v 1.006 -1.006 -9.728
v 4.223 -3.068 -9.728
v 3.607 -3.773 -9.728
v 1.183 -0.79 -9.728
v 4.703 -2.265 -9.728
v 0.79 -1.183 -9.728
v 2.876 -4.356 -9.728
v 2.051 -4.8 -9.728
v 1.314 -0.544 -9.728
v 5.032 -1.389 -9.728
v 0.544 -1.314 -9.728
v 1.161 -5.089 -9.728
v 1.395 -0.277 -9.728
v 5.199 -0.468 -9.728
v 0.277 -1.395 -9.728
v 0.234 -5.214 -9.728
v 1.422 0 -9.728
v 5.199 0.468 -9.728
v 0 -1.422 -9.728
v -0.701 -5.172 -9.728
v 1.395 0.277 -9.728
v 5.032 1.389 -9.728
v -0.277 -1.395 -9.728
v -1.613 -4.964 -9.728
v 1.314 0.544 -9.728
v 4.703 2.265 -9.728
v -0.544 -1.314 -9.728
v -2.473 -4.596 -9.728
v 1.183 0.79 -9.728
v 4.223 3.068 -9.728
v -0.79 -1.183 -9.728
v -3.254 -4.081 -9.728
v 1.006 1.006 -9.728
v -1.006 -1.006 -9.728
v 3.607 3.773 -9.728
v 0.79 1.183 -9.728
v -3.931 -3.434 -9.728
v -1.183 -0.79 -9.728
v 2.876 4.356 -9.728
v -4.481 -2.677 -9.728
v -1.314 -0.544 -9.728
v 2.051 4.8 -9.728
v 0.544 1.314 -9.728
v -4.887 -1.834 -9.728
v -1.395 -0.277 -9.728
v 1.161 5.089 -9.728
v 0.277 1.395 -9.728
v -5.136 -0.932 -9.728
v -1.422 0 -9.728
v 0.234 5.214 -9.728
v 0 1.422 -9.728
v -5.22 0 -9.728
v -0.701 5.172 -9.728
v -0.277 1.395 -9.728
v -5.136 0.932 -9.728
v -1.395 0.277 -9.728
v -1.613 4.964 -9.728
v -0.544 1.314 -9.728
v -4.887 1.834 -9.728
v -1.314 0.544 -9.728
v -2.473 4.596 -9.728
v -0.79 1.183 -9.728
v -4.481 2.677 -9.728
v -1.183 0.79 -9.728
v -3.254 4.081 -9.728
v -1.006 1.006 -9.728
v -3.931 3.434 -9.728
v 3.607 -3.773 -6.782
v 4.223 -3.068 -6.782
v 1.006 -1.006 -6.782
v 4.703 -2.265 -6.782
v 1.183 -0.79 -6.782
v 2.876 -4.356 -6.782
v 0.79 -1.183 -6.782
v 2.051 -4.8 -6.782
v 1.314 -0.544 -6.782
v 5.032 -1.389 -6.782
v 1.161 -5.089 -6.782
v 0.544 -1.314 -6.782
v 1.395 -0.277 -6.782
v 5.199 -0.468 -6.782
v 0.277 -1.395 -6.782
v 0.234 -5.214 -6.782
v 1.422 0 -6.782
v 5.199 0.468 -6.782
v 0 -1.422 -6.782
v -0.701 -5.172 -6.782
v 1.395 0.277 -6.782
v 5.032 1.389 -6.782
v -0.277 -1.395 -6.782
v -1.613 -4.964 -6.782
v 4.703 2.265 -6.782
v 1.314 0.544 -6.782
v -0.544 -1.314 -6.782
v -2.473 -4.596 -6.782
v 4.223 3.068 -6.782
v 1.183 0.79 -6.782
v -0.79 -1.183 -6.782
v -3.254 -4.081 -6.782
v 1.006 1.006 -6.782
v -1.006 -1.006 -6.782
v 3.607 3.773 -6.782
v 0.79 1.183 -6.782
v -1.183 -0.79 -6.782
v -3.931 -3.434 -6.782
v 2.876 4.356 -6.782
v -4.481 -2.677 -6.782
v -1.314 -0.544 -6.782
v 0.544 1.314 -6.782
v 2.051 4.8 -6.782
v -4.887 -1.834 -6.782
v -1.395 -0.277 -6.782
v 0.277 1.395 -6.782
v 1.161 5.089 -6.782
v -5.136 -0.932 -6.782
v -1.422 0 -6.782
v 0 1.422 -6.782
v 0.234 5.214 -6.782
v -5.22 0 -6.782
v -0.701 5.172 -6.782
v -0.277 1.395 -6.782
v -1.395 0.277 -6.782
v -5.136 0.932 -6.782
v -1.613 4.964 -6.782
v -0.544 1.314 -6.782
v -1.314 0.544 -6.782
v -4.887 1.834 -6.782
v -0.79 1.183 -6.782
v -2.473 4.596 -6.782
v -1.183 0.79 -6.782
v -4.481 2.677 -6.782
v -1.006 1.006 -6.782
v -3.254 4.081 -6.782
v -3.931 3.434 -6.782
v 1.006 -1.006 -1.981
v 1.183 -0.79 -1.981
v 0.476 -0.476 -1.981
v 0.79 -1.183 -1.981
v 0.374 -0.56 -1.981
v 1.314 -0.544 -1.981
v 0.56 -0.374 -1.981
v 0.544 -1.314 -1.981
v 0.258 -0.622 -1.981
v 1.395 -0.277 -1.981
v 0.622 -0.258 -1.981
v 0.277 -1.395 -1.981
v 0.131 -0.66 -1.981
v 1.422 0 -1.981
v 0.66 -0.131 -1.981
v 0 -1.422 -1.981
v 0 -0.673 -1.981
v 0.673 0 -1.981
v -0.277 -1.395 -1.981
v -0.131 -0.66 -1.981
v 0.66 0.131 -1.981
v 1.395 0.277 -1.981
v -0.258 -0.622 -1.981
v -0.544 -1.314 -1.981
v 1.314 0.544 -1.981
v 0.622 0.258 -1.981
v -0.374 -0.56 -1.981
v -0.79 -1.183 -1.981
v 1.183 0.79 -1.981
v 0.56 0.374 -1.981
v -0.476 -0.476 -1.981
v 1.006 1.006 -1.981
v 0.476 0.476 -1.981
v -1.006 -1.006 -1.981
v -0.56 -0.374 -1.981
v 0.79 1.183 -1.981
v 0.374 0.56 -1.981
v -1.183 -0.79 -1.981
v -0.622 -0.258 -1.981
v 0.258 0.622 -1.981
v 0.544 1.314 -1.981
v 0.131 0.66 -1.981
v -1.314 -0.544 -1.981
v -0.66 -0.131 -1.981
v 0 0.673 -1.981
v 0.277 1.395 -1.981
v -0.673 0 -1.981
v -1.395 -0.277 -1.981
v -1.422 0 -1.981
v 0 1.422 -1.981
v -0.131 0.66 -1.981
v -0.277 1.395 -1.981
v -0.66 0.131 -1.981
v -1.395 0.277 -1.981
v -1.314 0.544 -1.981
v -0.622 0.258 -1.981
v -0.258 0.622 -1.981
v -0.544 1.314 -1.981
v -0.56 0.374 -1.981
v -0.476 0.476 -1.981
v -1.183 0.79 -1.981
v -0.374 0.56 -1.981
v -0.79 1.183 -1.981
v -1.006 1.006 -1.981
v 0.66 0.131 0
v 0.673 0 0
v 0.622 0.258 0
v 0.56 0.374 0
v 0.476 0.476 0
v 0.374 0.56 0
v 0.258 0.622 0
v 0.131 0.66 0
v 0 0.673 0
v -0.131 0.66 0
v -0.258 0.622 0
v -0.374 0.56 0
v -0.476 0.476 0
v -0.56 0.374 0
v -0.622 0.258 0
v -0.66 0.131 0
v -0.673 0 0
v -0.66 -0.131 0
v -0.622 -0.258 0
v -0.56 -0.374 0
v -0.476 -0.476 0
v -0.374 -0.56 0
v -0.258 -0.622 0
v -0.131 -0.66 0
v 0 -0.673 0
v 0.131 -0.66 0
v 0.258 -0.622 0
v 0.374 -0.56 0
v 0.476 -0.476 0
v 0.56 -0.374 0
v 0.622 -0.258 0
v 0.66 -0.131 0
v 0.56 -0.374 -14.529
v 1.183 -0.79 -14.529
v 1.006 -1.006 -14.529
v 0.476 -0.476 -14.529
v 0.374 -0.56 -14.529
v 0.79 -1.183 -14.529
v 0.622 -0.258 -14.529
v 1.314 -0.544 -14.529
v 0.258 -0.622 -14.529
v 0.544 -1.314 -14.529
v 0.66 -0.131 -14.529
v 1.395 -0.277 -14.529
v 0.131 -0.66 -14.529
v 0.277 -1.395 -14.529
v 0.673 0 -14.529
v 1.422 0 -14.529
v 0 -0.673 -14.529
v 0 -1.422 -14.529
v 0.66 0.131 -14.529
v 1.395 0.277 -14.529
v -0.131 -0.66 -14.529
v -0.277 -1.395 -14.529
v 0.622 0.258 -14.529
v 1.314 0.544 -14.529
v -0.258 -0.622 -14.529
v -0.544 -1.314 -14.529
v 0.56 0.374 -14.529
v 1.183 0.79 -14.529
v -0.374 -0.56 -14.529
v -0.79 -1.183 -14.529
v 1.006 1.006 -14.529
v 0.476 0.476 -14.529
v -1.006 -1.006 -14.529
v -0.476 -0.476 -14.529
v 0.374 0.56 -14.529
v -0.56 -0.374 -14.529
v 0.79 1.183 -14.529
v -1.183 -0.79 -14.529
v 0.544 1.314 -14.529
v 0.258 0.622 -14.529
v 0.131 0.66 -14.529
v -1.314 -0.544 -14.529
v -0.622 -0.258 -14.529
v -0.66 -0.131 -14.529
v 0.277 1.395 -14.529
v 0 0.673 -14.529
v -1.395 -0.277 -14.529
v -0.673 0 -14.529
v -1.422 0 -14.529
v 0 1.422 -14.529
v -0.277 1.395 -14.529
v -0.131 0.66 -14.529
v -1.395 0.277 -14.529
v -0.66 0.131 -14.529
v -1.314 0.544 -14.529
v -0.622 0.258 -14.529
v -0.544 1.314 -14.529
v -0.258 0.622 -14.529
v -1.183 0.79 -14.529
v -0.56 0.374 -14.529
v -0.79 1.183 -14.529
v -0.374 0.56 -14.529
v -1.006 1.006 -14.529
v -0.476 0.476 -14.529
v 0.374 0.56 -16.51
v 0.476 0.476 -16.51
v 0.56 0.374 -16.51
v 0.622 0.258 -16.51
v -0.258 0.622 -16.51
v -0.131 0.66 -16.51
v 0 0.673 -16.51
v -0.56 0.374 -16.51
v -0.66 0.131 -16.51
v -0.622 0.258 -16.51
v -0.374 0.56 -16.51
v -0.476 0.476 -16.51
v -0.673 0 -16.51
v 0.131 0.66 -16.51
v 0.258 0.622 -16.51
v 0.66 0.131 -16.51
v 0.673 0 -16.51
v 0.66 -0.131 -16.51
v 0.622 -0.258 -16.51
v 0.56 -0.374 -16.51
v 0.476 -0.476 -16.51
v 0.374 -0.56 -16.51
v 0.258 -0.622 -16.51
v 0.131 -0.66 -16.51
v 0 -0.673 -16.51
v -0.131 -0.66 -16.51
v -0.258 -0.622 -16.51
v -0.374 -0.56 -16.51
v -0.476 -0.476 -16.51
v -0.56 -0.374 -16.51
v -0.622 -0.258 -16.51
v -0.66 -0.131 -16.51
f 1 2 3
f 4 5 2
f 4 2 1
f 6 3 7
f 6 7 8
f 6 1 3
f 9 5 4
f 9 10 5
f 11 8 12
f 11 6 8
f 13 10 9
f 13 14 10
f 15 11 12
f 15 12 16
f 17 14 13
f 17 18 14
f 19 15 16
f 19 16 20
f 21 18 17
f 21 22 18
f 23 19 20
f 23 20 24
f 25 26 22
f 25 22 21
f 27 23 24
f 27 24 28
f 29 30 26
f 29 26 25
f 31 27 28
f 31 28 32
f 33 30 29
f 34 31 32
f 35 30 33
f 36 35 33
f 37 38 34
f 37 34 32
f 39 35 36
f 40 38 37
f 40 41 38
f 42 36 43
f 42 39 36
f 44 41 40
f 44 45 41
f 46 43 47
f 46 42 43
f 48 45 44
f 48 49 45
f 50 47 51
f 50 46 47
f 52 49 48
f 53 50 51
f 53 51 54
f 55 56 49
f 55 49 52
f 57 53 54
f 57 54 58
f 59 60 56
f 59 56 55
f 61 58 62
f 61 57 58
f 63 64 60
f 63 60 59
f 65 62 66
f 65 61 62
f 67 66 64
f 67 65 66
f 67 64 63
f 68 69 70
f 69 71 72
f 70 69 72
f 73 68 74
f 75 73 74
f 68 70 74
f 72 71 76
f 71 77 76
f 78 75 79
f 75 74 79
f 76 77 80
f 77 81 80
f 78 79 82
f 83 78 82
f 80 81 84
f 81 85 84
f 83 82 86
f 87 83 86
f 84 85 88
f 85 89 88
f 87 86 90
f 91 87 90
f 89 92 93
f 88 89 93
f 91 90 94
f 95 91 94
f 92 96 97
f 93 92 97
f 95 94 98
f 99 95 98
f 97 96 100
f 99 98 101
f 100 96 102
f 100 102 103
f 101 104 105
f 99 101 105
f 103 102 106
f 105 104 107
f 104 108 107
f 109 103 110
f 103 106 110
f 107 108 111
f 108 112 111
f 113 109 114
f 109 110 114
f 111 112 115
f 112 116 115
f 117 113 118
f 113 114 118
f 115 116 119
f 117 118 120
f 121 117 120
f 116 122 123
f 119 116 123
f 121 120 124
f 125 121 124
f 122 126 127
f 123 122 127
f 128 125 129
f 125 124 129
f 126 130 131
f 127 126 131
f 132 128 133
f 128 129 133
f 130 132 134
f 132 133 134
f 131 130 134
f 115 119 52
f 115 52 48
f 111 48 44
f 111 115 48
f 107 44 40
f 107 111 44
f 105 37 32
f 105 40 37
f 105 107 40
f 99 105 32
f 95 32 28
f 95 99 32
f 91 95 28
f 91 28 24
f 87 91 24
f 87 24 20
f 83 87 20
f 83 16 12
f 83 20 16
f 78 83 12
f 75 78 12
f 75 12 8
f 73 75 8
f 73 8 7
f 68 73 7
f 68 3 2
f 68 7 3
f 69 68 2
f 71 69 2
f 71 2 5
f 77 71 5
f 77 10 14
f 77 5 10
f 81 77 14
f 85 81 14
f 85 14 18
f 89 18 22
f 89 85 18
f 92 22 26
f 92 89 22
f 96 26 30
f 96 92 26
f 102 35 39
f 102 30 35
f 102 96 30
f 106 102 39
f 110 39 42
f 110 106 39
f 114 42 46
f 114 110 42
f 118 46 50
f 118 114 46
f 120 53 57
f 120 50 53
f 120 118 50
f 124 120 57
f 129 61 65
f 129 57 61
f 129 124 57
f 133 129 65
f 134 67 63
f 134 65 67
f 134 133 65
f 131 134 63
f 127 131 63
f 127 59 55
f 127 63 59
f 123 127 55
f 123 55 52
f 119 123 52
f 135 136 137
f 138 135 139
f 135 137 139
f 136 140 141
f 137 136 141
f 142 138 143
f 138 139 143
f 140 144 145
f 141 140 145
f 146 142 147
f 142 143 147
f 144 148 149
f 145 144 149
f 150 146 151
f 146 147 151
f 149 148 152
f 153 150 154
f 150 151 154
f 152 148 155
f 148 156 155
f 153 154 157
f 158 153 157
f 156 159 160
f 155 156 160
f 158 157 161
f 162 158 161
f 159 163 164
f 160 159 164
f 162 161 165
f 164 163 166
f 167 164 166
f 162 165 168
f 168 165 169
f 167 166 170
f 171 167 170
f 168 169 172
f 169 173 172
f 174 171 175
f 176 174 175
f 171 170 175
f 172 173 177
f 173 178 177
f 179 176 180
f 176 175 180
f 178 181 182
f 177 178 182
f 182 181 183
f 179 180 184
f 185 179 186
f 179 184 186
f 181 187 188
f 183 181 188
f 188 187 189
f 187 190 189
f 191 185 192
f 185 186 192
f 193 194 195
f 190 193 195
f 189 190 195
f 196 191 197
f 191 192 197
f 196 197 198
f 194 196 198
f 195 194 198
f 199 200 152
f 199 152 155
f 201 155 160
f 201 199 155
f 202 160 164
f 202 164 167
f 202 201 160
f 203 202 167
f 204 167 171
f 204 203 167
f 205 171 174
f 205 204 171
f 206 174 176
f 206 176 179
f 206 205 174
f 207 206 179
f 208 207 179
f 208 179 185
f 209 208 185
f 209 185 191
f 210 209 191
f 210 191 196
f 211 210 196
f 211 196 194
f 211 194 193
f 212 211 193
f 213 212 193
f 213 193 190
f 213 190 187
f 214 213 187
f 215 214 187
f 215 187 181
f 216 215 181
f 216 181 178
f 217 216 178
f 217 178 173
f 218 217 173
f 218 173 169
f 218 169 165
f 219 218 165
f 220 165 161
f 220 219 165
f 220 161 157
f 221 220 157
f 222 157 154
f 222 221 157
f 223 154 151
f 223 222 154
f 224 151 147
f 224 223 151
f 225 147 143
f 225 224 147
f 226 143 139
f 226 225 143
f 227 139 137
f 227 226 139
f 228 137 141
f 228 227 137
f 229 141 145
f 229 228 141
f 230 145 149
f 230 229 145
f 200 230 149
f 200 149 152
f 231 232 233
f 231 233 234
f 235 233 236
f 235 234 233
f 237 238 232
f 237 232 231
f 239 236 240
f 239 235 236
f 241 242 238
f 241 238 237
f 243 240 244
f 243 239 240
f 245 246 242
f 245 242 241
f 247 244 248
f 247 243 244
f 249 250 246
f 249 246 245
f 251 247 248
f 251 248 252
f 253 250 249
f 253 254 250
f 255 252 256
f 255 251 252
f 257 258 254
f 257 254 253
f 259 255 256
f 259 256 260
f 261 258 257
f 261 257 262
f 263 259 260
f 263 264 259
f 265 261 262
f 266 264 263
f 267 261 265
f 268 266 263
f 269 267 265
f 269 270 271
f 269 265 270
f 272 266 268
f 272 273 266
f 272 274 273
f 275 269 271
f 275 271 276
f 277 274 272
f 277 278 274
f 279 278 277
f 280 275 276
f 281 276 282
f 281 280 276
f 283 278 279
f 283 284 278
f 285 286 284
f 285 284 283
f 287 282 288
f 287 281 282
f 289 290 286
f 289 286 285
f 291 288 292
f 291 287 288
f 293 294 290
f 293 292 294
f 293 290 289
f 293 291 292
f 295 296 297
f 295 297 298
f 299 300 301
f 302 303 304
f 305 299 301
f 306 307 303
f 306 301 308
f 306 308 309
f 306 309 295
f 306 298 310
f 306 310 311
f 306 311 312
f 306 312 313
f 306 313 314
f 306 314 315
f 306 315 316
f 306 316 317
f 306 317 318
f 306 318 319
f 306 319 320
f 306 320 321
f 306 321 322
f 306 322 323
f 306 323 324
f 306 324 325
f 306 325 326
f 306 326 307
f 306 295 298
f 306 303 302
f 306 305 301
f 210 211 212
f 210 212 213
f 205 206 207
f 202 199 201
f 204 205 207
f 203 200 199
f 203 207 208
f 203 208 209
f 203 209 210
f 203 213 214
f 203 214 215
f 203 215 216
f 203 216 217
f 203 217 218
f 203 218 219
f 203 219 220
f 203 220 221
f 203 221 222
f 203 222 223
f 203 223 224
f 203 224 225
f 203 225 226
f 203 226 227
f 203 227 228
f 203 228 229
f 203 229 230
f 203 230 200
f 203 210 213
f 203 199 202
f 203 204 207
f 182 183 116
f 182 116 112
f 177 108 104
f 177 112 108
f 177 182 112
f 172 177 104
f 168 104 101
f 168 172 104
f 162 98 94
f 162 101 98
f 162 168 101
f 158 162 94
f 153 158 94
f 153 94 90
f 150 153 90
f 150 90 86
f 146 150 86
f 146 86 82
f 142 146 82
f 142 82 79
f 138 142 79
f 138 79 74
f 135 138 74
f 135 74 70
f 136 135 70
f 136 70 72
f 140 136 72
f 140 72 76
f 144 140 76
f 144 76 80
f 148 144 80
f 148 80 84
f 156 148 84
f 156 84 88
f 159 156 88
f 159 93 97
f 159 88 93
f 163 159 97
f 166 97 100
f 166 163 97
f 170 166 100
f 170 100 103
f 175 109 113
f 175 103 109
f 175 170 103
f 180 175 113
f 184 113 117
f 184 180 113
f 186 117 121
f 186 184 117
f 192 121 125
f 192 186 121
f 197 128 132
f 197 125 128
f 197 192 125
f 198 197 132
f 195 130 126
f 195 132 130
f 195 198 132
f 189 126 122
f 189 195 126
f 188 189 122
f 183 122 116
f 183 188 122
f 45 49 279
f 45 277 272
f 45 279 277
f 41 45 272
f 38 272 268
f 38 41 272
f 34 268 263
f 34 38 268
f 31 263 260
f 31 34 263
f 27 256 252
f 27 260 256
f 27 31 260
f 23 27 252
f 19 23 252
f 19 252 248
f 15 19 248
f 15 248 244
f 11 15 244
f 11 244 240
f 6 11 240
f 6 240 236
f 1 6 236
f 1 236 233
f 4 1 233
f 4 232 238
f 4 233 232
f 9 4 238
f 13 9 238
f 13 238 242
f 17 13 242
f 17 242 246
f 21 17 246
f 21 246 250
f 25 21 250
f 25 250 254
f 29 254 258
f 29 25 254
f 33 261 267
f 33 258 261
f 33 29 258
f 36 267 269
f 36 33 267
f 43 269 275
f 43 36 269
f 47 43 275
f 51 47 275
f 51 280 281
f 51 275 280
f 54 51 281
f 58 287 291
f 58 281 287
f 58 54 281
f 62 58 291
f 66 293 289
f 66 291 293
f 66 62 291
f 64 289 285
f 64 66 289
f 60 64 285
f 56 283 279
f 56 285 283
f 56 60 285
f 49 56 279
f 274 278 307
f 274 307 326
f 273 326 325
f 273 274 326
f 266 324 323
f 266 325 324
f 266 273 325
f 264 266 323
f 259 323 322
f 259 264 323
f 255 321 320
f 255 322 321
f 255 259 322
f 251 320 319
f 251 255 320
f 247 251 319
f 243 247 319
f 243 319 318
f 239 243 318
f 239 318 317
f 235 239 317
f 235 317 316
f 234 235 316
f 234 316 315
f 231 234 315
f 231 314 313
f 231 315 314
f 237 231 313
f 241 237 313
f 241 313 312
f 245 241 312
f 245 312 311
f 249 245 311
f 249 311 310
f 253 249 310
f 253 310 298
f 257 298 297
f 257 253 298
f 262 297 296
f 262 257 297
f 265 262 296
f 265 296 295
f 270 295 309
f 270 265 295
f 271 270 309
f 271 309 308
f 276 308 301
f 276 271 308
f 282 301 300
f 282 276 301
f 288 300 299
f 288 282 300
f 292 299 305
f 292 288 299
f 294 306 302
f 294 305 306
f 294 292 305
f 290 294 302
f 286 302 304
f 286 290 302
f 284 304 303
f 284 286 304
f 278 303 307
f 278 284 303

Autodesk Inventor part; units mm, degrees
ref_plane "YZ Plane" through (0, 0, 0) normal (1, 0, 0) x (0, 1, 0)
ref_plane "XZ Plane" through (0, 0, 0) normal (0, 1, 0) x (-1, 0, 0)
ref_plane "XY Plane" through (0, 0, 0) normal (0, 0, 1) x (1, 0, 0)
sketch "Sketch1" plane through (0, 0, 0) normal (0, 0, 1) x (1, 0, 0)
  circle A0 centre (0, 0) radius 0.6731
  dimension "d0" = 1.3462
extrude "Extrusion1" add sketch "Sketch1" against normal blind 1.9812
sketch "Sketch2" plane through (0, 0, -1.9812) normal (0, 0, -1) x (-1, 0, 0)
  circle A0 centre (0, 0) radius 1.4224
  dimension "d3" = 2.8448
extrude "Extrusion2" add sketch "Sketch2" along normal blind 4.8006
sketch "Sketch3" plane through (0, 0, -6.7818) normal (0, 0, -1) x (-1, 0, 0)
  circle A0 centre (0, 0) radius 5.2197
  dimension "d6" = 10.4394
extrude "Extrusion3" add sketch "Sketch3" along normal blind 2.9464
sketch "Sketch4" plane through (0, 0, -9.7282) normal (0, 0, -1) x (-1, 0, 0)
  point P0 (0, 0)
sketch "Sketch5" plane through (0, 0, -9.7282) normal (0, 0, -1) x (-1, 0, 0)
  circle A0 centre (0, 0) radius 1.4224
  dimension "d9" = 2.8448
extrude "Extrusion4" add sketch "Sketch5" along normal blind 4.8006
sketch "Sketch6" plane through (0, 0, -14.5288) normal (0, 0, -1) x (-1, 0, 0)
  circle A0 centre (0, 0) radius 0.6731
  dimension "d12" = 1.3462
extrude "Extrusion5" add sketch "Sketch6" along normal blind 1.9812
properties part number "noisemaker"
